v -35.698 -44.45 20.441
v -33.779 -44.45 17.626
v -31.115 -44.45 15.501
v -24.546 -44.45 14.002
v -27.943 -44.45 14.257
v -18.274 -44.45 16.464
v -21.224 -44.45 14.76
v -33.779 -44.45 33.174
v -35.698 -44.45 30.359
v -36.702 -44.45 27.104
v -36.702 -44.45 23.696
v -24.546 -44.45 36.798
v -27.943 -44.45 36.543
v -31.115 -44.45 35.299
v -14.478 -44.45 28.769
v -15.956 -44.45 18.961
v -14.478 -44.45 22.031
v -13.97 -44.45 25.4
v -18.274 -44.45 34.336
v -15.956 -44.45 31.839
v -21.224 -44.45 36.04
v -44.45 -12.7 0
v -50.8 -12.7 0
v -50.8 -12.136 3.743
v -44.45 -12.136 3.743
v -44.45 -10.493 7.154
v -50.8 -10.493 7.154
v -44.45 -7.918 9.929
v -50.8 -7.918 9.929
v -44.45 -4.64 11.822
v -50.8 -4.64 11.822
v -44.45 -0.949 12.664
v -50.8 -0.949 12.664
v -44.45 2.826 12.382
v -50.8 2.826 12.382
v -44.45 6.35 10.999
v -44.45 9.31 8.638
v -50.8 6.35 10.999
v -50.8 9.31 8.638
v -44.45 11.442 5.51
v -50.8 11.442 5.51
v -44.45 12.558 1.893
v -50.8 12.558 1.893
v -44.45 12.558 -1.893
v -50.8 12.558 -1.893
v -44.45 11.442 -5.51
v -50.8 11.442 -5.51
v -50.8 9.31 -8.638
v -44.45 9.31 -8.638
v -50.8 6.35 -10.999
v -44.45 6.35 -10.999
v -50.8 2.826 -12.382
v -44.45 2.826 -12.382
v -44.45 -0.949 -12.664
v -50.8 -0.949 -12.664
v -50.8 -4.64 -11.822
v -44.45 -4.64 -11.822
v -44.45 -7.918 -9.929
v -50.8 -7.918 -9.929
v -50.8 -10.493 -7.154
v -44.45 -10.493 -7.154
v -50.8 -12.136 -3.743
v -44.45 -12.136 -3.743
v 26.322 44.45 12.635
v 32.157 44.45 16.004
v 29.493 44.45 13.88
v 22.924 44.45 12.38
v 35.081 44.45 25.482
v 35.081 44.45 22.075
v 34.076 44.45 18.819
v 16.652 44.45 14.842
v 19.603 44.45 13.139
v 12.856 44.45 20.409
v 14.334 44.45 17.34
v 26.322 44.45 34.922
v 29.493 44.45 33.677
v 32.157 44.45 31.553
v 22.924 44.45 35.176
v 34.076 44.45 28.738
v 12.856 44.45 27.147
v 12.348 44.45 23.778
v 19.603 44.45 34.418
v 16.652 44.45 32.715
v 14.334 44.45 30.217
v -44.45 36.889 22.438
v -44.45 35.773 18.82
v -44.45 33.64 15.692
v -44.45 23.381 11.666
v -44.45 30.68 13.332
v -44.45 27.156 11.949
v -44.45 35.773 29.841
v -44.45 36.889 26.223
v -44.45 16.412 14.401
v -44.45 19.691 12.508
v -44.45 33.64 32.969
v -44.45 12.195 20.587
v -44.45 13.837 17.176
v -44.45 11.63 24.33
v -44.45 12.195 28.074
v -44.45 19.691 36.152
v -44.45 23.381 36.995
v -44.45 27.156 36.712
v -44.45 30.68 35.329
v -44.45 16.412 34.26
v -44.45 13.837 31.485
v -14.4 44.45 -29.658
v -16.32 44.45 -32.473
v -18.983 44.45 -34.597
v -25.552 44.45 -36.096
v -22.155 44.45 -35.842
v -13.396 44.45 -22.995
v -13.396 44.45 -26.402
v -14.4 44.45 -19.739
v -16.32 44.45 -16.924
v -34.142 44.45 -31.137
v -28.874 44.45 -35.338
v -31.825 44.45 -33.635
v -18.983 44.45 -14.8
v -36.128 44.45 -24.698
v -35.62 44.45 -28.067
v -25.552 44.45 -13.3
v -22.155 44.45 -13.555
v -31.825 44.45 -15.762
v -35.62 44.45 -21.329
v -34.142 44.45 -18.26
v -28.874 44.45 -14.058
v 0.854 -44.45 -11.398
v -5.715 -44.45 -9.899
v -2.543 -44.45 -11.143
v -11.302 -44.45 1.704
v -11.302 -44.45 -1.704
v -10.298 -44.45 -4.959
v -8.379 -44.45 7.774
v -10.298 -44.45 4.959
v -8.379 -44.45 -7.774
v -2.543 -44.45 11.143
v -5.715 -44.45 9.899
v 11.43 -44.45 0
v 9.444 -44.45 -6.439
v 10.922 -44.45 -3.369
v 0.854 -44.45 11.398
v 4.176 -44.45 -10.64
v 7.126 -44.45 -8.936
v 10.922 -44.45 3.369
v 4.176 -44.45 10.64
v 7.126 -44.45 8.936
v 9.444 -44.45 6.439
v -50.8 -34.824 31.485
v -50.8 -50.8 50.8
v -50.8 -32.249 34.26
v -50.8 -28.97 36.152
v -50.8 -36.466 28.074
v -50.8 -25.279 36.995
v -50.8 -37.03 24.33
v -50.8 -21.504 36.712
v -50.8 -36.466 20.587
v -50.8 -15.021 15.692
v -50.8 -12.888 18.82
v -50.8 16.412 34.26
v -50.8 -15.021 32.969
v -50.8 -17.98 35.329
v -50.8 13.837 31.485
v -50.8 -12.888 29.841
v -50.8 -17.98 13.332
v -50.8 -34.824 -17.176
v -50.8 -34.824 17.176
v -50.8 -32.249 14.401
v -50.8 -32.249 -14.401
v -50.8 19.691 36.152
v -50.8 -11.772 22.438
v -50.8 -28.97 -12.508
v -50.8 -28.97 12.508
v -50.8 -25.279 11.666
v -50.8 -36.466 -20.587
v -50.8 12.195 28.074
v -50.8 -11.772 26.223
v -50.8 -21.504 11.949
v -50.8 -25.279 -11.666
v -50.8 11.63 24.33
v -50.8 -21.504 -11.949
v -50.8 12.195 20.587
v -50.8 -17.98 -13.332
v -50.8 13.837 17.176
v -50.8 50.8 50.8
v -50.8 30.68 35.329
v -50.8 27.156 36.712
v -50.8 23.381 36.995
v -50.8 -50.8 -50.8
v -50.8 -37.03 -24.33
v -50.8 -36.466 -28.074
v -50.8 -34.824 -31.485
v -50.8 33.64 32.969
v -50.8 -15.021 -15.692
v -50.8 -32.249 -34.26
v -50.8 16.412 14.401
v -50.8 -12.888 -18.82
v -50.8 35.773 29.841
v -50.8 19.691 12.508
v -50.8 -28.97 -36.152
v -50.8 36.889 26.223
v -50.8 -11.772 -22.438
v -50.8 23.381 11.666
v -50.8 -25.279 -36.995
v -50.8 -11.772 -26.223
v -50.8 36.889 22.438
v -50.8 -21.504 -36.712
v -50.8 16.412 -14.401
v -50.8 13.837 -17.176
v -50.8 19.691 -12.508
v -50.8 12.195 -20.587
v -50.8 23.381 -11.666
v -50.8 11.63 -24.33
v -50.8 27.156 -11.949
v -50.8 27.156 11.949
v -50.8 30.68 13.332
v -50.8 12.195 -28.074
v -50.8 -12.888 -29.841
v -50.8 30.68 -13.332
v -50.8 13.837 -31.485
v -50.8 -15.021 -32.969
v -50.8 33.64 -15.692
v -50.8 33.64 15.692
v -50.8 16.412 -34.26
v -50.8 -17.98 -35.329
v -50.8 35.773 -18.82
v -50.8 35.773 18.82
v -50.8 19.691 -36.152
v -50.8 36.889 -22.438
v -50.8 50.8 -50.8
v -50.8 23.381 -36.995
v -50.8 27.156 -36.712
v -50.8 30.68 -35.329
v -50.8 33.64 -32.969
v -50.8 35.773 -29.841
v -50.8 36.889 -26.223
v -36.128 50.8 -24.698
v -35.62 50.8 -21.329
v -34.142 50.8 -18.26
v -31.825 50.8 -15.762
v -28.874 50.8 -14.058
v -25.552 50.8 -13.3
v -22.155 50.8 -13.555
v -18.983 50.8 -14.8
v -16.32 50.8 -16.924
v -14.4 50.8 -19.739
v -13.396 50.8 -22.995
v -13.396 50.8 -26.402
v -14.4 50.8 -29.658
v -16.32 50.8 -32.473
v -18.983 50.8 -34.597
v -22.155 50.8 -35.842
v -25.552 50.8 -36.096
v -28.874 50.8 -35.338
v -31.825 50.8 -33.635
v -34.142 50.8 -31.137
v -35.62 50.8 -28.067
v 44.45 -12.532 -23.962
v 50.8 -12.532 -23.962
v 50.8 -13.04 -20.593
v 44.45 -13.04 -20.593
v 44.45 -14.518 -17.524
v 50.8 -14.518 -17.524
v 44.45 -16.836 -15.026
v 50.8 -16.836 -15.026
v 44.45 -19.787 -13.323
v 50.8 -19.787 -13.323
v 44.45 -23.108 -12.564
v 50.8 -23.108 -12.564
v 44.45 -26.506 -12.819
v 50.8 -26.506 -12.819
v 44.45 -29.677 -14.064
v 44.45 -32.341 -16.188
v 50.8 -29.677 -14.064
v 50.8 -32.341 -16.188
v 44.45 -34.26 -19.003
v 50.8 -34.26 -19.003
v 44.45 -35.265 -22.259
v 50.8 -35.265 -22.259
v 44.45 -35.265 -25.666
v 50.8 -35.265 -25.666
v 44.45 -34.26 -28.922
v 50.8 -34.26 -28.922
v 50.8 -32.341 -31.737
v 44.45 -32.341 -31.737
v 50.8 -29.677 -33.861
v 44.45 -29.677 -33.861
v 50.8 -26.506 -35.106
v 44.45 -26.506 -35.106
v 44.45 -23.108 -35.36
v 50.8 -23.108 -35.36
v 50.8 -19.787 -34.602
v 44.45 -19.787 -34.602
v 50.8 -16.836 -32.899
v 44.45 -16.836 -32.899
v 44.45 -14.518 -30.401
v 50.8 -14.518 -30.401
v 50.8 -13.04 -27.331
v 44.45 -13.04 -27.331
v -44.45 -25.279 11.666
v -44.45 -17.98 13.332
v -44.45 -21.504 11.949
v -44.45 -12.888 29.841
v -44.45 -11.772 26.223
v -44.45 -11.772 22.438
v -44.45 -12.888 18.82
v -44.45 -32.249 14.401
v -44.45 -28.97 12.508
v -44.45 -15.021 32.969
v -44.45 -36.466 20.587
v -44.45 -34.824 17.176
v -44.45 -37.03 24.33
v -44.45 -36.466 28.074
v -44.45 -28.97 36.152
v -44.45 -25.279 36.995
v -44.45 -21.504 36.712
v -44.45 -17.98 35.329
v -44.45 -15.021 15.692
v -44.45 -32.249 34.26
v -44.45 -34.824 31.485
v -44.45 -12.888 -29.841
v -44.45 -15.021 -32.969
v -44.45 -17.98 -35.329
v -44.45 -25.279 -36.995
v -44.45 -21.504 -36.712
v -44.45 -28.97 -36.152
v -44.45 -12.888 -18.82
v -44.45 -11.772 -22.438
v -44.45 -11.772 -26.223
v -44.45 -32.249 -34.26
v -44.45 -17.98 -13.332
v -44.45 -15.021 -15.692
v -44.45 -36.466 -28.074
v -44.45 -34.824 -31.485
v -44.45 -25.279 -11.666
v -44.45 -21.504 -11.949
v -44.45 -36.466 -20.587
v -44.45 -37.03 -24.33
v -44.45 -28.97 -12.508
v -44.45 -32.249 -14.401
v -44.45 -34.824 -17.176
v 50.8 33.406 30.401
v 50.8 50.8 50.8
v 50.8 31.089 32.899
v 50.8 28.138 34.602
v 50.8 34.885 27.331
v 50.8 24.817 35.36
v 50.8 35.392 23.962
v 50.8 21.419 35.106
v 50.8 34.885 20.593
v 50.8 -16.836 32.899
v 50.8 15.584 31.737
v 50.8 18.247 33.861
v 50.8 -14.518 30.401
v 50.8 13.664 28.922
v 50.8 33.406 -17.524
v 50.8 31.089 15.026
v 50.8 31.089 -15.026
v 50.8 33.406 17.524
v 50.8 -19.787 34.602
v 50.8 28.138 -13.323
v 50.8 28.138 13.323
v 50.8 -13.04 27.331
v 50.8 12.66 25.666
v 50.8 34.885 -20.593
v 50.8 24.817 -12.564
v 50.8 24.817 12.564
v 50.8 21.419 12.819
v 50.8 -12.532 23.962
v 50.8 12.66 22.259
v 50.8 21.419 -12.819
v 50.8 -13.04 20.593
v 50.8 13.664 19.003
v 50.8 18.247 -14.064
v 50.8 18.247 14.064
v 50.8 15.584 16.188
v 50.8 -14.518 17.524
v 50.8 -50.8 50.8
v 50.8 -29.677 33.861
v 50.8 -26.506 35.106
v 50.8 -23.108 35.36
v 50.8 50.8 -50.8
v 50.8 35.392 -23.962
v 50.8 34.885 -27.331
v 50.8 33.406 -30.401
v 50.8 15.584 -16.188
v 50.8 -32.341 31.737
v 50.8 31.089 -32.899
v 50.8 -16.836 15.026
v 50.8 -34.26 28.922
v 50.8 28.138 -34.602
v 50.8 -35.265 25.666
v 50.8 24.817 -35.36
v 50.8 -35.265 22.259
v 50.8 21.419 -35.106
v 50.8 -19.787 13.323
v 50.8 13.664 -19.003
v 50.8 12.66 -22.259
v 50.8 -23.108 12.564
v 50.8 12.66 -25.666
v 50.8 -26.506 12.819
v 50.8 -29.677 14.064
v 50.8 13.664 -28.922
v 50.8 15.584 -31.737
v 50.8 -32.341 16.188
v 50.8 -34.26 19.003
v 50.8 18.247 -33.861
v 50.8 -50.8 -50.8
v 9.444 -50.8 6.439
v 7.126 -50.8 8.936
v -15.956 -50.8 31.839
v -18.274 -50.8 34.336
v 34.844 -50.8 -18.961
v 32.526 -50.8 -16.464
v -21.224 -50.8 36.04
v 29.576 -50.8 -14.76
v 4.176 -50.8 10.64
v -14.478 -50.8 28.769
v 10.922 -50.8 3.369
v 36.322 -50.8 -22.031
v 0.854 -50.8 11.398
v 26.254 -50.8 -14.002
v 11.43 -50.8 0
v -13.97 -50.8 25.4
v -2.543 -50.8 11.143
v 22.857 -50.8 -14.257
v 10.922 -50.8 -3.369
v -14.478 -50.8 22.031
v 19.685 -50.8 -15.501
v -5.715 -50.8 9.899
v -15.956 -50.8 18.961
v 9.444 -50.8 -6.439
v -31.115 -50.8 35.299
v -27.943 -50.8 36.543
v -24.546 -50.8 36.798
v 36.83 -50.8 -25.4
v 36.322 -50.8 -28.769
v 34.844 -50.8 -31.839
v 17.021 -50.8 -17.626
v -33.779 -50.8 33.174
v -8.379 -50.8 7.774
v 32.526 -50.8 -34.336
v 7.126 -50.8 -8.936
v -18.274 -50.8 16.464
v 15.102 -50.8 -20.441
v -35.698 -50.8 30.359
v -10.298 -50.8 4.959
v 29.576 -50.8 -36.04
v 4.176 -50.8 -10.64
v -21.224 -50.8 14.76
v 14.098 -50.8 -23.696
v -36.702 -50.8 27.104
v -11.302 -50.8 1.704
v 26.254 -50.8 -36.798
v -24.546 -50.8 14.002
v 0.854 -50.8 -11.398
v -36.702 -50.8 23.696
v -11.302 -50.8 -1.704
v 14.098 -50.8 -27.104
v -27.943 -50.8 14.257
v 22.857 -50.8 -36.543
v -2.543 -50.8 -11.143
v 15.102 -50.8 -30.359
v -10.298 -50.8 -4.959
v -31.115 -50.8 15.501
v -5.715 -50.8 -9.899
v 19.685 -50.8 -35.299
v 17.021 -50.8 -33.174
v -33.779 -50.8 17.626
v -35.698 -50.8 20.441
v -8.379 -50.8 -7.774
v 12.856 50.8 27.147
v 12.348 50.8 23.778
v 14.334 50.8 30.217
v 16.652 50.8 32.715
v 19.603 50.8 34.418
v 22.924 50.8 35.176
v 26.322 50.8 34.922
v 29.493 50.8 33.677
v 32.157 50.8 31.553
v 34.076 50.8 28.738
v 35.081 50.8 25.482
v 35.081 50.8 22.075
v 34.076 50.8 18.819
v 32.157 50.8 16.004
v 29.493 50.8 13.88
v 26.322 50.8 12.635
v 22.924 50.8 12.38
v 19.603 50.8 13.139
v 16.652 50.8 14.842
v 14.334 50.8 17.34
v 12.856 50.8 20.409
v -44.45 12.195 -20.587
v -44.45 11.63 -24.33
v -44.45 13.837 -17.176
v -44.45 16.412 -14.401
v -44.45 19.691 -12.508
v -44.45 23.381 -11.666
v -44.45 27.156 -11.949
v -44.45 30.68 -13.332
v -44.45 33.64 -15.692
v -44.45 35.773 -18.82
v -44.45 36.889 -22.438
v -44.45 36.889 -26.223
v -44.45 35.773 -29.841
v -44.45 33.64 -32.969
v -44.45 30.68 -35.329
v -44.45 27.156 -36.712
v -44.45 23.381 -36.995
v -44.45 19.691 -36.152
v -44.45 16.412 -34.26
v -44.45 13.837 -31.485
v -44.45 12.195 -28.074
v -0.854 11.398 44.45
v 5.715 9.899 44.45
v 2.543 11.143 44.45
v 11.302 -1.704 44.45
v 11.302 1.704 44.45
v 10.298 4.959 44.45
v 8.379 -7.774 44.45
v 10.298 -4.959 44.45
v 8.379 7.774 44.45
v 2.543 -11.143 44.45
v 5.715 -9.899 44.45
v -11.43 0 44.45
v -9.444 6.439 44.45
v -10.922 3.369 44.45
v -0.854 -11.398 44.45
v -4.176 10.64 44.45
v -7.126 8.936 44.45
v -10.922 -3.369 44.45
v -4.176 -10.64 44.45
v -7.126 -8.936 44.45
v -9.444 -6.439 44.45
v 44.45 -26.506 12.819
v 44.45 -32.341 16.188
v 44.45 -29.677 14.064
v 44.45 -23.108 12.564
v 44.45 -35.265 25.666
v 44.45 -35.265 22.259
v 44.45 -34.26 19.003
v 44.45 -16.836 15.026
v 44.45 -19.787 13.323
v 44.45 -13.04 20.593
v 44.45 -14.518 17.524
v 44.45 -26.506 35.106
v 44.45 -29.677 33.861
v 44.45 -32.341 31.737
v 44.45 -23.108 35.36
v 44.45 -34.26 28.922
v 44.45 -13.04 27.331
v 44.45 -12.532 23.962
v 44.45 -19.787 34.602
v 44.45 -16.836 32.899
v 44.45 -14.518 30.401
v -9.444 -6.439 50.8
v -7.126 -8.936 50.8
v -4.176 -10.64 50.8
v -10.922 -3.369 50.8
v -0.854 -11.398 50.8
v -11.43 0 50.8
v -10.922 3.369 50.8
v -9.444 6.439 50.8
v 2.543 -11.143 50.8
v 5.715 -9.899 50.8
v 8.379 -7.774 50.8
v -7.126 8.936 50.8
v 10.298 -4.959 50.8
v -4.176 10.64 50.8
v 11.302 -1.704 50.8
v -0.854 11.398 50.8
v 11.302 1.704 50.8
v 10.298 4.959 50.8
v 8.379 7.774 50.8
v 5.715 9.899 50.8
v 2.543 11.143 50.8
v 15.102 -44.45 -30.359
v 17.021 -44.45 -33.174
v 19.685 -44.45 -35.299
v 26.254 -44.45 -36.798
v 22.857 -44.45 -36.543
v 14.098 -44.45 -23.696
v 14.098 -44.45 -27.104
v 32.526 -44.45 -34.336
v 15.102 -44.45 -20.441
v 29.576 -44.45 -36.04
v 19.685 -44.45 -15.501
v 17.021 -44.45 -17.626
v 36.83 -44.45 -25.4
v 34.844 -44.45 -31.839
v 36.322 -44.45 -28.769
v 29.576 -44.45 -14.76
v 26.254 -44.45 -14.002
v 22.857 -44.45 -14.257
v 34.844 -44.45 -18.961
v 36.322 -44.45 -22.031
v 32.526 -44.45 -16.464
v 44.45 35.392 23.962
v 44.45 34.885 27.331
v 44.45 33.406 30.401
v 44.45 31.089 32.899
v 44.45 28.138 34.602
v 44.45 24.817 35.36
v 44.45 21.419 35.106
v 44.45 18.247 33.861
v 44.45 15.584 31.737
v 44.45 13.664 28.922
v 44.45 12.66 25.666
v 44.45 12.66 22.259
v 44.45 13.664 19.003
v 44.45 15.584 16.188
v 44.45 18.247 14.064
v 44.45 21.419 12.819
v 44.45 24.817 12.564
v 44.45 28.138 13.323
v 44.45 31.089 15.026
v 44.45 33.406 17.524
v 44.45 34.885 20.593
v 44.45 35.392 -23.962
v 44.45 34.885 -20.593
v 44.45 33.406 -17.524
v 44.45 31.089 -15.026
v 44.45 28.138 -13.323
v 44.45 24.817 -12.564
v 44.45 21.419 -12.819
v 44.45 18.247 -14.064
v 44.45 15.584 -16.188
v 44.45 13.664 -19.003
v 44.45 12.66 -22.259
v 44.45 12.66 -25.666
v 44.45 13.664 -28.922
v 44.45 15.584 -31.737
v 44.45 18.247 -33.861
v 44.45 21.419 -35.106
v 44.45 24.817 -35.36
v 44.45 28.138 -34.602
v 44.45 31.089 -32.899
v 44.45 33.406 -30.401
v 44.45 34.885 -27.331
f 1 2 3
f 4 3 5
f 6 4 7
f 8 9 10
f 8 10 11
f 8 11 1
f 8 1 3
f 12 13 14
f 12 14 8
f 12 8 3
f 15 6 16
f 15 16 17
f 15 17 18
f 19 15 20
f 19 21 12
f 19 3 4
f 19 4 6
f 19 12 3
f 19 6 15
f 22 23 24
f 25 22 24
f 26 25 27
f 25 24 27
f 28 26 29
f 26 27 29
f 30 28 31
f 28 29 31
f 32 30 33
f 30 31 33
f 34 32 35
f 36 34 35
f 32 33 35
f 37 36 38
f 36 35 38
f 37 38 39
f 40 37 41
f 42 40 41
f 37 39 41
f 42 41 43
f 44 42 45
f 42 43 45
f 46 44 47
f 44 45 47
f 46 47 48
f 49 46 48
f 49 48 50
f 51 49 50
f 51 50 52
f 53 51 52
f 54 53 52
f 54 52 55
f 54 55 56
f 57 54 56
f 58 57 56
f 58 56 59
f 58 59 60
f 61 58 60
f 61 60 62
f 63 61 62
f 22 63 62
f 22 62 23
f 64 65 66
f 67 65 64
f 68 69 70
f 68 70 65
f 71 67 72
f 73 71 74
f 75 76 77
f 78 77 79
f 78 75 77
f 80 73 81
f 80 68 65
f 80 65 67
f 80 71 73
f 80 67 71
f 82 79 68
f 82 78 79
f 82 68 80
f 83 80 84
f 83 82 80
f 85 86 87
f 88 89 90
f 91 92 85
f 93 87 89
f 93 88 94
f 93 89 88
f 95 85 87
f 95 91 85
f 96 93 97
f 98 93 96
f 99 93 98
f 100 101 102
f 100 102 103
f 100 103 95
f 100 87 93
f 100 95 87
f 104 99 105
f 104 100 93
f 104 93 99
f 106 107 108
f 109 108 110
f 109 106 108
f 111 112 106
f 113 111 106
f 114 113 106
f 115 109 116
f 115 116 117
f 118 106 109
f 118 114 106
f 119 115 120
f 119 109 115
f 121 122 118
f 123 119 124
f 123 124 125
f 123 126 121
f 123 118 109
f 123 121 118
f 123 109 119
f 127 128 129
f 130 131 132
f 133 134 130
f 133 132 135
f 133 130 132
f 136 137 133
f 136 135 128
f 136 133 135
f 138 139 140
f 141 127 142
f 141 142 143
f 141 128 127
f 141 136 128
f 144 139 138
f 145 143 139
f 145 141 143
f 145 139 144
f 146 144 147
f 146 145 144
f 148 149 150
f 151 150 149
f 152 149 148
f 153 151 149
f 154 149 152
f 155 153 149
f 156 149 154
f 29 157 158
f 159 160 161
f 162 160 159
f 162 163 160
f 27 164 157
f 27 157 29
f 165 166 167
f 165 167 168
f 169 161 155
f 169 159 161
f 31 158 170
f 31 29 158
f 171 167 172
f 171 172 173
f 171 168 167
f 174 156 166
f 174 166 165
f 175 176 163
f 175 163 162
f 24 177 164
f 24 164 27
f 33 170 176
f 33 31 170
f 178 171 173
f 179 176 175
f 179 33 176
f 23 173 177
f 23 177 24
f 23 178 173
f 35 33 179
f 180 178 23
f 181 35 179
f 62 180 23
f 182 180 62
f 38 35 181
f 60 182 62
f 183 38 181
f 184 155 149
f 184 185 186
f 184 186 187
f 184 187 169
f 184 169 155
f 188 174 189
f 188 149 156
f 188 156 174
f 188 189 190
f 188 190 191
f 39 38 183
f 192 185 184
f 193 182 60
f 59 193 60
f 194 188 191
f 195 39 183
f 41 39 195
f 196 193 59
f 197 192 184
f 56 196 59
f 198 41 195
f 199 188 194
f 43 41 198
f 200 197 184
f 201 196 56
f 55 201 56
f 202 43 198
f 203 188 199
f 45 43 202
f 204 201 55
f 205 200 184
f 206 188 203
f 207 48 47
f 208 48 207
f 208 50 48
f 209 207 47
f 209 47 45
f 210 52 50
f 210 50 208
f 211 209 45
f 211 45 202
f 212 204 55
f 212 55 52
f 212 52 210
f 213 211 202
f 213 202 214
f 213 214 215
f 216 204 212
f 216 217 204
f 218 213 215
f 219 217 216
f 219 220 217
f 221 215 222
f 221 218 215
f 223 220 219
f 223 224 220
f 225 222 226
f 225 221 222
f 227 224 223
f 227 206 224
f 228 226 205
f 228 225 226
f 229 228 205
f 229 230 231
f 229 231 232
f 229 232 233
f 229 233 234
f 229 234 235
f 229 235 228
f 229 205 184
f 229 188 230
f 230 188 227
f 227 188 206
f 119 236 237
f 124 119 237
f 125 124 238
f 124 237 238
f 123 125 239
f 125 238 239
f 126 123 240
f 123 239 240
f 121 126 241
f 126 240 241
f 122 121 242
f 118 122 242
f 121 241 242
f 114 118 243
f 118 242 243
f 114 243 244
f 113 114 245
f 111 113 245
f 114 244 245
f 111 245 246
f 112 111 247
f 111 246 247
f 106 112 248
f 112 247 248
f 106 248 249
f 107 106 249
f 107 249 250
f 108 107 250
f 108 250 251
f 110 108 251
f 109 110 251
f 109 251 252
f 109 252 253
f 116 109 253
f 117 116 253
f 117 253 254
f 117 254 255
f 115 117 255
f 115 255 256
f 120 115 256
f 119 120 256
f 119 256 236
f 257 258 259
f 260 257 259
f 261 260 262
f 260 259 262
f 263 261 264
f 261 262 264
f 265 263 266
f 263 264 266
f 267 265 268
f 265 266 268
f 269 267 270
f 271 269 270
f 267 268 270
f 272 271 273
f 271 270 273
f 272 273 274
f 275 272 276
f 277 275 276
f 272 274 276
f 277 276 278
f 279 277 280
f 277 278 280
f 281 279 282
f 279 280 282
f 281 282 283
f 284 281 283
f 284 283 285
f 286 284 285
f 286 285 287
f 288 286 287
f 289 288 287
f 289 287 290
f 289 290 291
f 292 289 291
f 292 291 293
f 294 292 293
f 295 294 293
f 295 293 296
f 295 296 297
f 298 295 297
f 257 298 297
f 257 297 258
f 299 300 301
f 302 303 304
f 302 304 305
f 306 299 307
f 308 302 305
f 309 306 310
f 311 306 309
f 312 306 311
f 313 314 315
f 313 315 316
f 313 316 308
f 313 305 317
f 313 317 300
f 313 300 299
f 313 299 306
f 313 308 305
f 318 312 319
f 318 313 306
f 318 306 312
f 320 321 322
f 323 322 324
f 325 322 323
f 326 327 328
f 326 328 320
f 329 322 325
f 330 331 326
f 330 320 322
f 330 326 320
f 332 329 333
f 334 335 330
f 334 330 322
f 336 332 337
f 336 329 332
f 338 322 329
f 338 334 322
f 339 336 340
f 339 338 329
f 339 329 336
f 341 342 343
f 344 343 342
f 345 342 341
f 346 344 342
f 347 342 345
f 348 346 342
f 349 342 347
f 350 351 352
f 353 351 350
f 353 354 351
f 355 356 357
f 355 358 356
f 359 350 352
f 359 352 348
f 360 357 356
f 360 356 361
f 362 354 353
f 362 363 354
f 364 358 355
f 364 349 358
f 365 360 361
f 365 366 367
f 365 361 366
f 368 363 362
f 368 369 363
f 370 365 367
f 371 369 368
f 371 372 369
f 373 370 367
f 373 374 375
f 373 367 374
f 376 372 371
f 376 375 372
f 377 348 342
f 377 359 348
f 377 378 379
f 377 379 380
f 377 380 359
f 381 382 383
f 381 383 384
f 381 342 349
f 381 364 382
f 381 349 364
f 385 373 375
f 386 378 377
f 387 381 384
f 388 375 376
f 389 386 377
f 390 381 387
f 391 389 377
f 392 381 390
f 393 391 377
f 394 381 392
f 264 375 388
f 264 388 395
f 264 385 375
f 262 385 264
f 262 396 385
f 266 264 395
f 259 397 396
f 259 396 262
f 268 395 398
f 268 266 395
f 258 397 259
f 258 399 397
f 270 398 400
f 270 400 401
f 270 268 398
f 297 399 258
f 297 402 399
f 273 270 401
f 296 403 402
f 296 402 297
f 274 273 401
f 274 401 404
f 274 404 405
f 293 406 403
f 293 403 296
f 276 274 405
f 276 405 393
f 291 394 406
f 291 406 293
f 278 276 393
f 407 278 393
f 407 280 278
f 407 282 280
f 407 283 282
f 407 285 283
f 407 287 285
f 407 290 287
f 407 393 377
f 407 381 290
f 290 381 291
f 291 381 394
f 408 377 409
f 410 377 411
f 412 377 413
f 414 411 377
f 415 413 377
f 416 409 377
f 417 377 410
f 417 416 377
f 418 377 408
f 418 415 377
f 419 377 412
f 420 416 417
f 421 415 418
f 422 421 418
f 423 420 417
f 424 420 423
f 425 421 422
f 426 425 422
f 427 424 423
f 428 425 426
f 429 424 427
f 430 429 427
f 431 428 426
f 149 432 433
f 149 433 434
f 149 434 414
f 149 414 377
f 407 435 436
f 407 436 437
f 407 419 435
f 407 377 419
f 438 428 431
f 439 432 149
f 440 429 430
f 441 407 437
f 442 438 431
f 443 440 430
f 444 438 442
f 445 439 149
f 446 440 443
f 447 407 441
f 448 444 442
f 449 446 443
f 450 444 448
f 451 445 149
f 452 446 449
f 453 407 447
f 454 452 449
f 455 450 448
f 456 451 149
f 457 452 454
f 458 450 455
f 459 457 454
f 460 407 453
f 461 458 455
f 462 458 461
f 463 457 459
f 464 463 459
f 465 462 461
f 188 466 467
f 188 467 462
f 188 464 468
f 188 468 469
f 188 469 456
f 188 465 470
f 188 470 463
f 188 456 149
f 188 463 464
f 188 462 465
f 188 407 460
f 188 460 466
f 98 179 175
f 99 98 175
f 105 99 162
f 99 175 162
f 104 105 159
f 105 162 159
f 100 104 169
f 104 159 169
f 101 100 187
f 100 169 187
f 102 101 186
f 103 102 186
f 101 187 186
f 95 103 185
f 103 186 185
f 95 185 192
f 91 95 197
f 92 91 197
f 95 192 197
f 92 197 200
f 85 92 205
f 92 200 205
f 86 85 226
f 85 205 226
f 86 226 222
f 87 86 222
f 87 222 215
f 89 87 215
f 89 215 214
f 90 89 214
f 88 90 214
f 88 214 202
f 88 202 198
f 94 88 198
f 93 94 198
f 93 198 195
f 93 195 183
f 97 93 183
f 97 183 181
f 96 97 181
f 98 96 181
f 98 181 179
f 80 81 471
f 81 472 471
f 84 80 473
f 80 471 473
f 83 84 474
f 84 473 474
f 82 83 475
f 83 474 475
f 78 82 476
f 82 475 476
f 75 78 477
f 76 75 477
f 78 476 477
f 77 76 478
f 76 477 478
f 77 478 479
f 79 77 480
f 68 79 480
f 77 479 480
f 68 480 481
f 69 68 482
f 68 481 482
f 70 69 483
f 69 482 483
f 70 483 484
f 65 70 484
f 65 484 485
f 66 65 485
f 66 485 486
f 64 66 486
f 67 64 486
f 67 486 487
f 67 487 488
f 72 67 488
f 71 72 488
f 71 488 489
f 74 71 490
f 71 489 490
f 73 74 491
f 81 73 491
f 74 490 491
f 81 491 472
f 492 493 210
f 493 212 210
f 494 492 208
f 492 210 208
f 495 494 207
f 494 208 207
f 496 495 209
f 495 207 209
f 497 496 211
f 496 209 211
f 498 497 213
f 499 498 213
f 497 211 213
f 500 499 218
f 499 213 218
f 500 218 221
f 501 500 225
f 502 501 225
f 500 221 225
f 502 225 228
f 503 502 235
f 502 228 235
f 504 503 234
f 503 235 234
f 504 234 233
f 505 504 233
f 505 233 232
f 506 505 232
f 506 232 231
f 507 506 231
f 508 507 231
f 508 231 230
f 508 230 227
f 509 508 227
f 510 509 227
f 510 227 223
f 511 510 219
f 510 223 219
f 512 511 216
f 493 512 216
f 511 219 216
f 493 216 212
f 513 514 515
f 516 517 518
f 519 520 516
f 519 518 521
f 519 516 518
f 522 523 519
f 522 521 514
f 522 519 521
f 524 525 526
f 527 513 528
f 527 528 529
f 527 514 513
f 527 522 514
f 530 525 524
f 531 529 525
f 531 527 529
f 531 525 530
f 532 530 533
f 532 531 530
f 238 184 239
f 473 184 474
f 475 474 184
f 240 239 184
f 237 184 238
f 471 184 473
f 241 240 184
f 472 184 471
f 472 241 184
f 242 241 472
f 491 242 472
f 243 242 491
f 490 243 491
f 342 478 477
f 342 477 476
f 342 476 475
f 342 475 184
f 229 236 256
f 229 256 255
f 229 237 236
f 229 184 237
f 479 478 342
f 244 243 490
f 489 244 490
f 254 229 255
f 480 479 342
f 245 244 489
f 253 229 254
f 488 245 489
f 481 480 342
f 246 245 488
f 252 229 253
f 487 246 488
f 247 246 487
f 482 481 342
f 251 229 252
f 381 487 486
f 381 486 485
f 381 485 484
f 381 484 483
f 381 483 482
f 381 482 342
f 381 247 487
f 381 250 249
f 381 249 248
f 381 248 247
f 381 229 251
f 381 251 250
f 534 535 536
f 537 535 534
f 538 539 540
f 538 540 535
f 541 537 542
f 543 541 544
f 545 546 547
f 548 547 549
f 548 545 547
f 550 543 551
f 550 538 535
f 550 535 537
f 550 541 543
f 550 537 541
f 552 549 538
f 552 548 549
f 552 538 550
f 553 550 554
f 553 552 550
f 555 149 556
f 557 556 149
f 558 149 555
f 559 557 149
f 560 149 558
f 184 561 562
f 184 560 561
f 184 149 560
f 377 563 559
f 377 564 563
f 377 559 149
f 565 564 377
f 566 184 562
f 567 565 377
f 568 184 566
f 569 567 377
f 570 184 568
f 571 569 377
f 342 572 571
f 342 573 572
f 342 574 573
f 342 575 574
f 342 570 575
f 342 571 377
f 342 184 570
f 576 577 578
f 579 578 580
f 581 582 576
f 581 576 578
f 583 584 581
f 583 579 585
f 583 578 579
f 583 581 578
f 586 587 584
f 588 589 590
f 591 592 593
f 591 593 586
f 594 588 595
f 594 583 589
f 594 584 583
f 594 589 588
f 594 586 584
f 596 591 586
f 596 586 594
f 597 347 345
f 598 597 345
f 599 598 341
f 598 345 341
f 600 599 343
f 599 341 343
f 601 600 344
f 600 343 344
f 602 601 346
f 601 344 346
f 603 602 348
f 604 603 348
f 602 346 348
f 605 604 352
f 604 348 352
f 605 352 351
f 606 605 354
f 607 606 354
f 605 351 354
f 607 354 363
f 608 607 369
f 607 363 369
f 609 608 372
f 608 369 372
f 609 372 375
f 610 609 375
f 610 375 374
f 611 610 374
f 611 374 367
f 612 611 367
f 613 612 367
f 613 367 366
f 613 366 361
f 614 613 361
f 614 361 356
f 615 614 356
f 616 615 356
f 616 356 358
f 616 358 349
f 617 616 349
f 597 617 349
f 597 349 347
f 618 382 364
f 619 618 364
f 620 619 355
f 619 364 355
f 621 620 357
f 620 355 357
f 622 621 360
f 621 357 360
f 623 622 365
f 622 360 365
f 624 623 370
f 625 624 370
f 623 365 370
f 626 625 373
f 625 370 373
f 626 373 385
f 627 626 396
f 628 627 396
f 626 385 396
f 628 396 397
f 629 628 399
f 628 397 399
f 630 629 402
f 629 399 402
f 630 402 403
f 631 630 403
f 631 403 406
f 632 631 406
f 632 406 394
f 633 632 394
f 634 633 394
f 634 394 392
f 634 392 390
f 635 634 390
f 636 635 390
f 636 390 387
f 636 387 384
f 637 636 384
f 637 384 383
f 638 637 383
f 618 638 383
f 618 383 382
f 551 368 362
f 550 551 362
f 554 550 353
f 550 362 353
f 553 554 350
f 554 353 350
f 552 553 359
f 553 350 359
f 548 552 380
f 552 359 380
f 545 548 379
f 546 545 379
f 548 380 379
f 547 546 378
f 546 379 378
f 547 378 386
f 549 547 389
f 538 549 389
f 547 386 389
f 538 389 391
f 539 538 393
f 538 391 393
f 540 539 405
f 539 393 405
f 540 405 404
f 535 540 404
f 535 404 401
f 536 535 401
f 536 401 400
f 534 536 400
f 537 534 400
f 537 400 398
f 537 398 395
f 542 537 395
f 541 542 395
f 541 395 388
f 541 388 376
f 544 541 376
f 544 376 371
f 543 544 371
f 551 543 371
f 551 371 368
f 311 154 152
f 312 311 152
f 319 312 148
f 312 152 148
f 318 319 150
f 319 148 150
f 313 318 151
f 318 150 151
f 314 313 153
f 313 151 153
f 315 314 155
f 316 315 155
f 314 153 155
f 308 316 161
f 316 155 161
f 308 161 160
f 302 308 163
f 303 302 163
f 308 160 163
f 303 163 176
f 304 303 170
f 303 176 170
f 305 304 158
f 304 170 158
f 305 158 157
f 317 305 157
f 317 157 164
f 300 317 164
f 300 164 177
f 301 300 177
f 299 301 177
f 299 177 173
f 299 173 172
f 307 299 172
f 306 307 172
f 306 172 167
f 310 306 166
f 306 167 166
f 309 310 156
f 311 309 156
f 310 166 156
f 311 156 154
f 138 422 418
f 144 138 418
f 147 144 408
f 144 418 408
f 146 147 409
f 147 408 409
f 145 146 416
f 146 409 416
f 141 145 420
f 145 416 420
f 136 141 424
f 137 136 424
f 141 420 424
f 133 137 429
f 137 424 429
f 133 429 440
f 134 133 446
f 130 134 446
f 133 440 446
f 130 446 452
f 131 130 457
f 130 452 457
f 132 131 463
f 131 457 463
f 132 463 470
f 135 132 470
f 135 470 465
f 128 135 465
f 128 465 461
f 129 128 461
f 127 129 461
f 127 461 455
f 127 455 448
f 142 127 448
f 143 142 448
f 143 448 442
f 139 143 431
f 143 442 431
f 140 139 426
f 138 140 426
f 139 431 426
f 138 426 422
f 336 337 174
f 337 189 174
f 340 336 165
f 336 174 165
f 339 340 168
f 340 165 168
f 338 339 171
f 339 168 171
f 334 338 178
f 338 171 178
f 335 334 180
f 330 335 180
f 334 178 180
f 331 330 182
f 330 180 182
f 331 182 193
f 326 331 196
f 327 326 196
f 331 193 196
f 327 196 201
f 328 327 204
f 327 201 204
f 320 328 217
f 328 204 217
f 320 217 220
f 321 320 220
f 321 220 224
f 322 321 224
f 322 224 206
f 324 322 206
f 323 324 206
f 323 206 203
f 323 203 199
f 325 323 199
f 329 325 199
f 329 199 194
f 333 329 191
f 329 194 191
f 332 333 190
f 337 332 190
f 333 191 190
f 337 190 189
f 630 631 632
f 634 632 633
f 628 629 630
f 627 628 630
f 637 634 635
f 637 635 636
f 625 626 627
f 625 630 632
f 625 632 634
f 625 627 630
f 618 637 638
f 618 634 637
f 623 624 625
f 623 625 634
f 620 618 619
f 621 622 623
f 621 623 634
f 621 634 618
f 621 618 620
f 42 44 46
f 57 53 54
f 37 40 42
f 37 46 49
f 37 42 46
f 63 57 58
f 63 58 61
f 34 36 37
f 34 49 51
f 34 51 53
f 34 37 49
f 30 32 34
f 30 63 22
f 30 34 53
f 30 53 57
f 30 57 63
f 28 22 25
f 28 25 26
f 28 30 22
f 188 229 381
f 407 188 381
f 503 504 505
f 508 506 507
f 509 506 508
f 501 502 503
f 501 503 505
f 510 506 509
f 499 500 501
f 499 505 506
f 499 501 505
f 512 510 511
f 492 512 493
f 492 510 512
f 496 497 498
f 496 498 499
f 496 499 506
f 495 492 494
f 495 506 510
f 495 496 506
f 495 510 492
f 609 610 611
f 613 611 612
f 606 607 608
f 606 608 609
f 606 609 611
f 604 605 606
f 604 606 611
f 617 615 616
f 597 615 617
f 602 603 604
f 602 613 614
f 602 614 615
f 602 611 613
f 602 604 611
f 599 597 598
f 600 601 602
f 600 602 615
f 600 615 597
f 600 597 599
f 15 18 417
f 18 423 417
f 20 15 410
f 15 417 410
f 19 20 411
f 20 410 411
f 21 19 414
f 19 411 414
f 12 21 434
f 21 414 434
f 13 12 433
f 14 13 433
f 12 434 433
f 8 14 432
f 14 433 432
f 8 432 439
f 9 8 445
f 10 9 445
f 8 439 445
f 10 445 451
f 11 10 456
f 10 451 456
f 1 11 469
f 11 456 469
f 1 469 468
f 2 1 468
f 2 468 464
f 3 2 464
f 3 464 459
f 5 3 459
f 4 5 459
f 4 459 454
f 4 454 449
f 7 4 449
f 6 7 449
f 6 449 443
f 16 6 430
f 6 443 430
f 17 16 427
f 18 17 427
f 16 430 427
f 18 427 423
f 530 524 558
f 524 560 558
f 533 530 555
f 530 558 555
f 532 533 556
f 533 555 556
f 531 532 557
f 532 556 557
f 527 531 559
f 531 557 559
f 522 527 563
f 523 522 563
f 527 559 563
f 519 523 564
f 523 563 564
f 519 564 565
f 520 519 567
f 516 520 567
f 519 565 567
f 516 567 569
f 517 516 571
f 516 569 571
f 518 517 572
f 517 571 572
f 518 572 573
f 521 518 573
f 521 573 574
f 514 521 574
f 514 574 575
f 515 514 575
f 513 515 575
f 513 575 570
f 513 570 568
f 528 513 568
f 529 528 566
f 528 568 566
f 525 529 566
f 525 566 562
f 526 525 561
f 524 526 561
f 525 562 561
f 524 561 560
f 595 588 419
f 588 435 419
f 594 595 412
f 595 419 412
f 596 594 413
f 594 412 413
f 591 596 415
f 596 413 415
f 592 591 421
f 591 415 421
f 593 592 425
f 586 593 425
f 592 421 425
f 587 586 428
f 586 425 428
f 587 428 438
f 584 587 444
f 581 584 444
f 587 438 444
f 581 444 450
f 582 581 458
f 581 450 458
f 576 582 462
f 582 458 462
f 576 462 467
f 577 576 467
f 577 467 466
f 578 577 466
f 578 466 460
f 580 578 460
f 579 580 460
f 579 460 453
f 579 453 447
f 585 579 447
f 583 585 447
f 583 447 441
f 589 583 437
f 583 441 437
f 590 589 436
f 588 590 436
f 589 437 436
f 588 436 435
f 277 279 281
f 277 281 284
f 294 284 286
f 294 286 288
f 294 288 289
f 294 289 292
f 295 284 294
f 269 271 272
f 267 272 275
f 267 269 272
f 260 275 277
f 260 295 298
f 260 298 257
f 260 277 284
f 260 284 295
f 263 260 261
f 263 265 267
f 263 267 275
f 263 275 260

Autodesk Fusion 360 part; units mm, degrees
sketch "Sketch1" plane through (0, 0, 0) normal (0, 0, 1) x (1, 0, 0) in component "Component"
  line L0 (50.8, -50.8) -> (-50.8, -50.8)
  line L1 (-50.8, -50.8) -> (-50.8, 50.8)
  line L2 (-50.8, 50.8) -> (50.8, 50.8)
  line L3 (50.8, 50.8) -> (50.8, -50.8)
  line L4 (50.8, -50.8) -> (-50.8, 50.8) construction
  line L5 (-50.8, -50.8) -> (50.8, 50.8) construction
  dimension "d1" = 101.6
  dimension "d2" = 101.6
extrude "Extrude1" add sketch "Sketch1" along normal mid plane 101.6 in component "Component"
sketch "Sketch2" plane through (0, 0, 50.8) normal (0, 0, 1) x (-1, 0, 0) in component "Component"
  line L0 (-50.8, -50.8) -> (50.8, -50.8)
  line L1 (50.8, -50.8) -> (50.8, 50.8)
  line L2 (50.8, 50.8) -> (-50.8, 50.8)
  line L3 (-50.8, 50.8) -> (-50.8, -50.8)
  circle A0 centre (0, 0) radius 11.43
  dimension "d5" = 22.86
extrude "Extrude2" cut sketch "Sketch2" against normal blind 6.35 contours A0 in component "Component"
sketch "Sketch3" plane through (0, -50.8, 0) normal (0, -1, 0) x (1, 0, 0) in component "Component"
  line L0 (50.8, -50.8) -> (50.8, 50.8)
  line L1 (50.8, 50.8) -> (-50.8, 50.8)
  line L2 (-50.8, 50.8) -> (-50.8, -50.8)
  line L3 (-50.8, -50.8) -> (50.8, -50.8)
  circle A0 centre (0, 0) radius 11.43
  line L4 (-50.8, 50.8) -> (0, 0)
  line L5 (0, 0) -> (50.8, -50.8)
  circle A1 centre (-25.4, 25.4) radius 11.43
  circle A2 centre (25.4, -25.4) radius 11.43
  dimension "d8" = 22.86
  dimension "d9" = 22.86
  dimension "d10" = 22.86
extrude "Extrude3" cut sketch "Sketch3" against normal blind 6.35 contours L5 A2 | L5 A2 | L4 A1 | L4 A1 | A0 L4 L5 | A0 L4 L5 in component "Component"
sketch "Sketch4" plane through (50.8, 0, 0) normal (1, 0, 0) x (0, 1, 0) in component "Component"
  line L0 (50.8, -50.8) -> (50.8, 50.8)
  line L1 (50.8, 50.8) -> (-50.8, 50.8)
  line L2 (-50.8, 50.8) -> (-50.8, -50.8)
  line L3 (-50.8, -50.8) -> (50.8, -50.8)
  line L4 (-50.8, 50.8) -> (50.8, -50.8)
  line L5 (-50.8, -50.8) -> (50.8, 50.8) construction
  circle A0 centre (-23.9624, 23.9624) radius 11.43
  circle A1 centre (23.9624, 23.9624) radius 11.43
  circle A2 centre (-23.9624, -23.9624) radius 11.43
  circle A3 centre (23.9624, -23.9624) radius 11.43
  dimension "d13" = 22.86
extrude "Extrude4" cut sketch "Sketch4" against normal blind 6.35 contours L4 A3 | L4 A3 | L4 A0 | L4 A0 | A1 | A2 in component "Component"
sketch "Sketch5" plane through (0, 50.8, 0) normal (0, 1, 0) x (-1, 0, 0) in component "Component"
  line L0 (50.8, -50.8) -> (50.8, 50.8)
  line L1 (50.8, 50.8) -> (-50.8, 50.8)
  line L2 (-50.8, 50.8) -> (-50.8, -50.8)
  line L3 (-50.8, -50.8) -> (50.8, -50.8)
  line L4 (-50.8, 50.8) -> (50.8, -50.8)
  circle A0 centre (24.6983, -24.6983) radius 11.43
  circle A1 centre (-23.7784, 23.7784) radius 11.43
  dimension "d16" = 22.86
extrude "Extrude5" cut sketch "Sketch5" against normal blind 6.35 contours L4 A0 | L4 A0 | L4 A1 | L4 A1 in component "Component"
sketch "Sketch6" plane through (-50.8, 0, 0) normal (-1, 0, 0) x (0, -1, 0) in component "Component"
  line L0 (50.8, -50.8) -> (50.8, 50.8)
  line L1 (50.8, 50.8) -> (-50.8, 50.8)
  line L2 (-50.8, 50.8) -> (-50.8, -50.8)
  line L3 (-50.8, -50.8) -> (50.8, -50.8)
  line L4 (-50.8, 50.8) -> (50.8, -50.8)
  line L5 (-50.8, -50.8) -> (50.8, 50.8)
  circle A0 centre (0, 0) radius 12.7
  circle A1 centre (-24.3304, 24.3304) radius 12.7
  circle A2 centre (24.3304, 24.3304) radius 12.7
  circle A3 centre (-24.3304, -24.3304) radius 12.7
  circle A4 centre (24.3304, -24.3304) radius 12.7
  dimension "d19" = 25.4
extrude "Extrude6" cut sketch "Sketch6" against normal blind 6.35 contours L4 A4 | L4 A4 | L5 A2 | L5 A2 | L5 A3 | L5 A3 | L4 A1 | L4 A1 | L4 L5 A0 | L4 L5 A0 | L4 L5 A0 | L4 L5 A0 in component "Component"
sketch "Sketch7" plane through (0, 0, -50.8) normal (0, 0, -1) x (1, 0, 0) in component "Component"
  line L0 (-50.8, -50.8) -> (50.8, -50.8)
  line L1 (50.8, -50.8) -> (50.8, 50.8)
  line L2 (50.8, 50.8) -> (-50.8, 50.8)
  line L3 (-50.8, 50.8) -> (-50.8, -50.8)
sketch "Sketch8" plane through (0, 50.8, 0) normal (0, 1, 0) x (-1, 0, 0) in component "Component"
  circle A0 centre (24.6983, -24.6983) radius 11.43
  circle A1 centre (-23.7784, 23.7784) radius 11.43
  line L0 (50.8, -50.8) -> (50.8, 50.8)
  line L1 (50.8, 50.8) -> (-50.8, 50.8)
  line L2 (-50.8, 50.8) -> (-50.8, -50.8)
  line L3 (-50.8, -50.8) -> (50.8, -50.8)
sketch "Sketch10" plane through (0, 0, -50.8) normal (0, 0, -1) x (1, 0, 0) in component "Component"
component "Component" placed x (1, 0, 0) y (0, 1, 0) z (0, 0, 1) at (0, 0, 0)
equation "d1 = dicesize"
equation "d2 = dicesize"
equation "d5 = Divotsize"
equation "d8 = Divotsize"
equation "d9 = Divotsize"
equation "d10 = Divotsize"
equation "d13 = Divotsize"
equation "d16 = Divotsize"
equation "dicesize = 4 in"
equation "Divotsize = 0.9 in"
equation "diceDepth = 0.25 in"
